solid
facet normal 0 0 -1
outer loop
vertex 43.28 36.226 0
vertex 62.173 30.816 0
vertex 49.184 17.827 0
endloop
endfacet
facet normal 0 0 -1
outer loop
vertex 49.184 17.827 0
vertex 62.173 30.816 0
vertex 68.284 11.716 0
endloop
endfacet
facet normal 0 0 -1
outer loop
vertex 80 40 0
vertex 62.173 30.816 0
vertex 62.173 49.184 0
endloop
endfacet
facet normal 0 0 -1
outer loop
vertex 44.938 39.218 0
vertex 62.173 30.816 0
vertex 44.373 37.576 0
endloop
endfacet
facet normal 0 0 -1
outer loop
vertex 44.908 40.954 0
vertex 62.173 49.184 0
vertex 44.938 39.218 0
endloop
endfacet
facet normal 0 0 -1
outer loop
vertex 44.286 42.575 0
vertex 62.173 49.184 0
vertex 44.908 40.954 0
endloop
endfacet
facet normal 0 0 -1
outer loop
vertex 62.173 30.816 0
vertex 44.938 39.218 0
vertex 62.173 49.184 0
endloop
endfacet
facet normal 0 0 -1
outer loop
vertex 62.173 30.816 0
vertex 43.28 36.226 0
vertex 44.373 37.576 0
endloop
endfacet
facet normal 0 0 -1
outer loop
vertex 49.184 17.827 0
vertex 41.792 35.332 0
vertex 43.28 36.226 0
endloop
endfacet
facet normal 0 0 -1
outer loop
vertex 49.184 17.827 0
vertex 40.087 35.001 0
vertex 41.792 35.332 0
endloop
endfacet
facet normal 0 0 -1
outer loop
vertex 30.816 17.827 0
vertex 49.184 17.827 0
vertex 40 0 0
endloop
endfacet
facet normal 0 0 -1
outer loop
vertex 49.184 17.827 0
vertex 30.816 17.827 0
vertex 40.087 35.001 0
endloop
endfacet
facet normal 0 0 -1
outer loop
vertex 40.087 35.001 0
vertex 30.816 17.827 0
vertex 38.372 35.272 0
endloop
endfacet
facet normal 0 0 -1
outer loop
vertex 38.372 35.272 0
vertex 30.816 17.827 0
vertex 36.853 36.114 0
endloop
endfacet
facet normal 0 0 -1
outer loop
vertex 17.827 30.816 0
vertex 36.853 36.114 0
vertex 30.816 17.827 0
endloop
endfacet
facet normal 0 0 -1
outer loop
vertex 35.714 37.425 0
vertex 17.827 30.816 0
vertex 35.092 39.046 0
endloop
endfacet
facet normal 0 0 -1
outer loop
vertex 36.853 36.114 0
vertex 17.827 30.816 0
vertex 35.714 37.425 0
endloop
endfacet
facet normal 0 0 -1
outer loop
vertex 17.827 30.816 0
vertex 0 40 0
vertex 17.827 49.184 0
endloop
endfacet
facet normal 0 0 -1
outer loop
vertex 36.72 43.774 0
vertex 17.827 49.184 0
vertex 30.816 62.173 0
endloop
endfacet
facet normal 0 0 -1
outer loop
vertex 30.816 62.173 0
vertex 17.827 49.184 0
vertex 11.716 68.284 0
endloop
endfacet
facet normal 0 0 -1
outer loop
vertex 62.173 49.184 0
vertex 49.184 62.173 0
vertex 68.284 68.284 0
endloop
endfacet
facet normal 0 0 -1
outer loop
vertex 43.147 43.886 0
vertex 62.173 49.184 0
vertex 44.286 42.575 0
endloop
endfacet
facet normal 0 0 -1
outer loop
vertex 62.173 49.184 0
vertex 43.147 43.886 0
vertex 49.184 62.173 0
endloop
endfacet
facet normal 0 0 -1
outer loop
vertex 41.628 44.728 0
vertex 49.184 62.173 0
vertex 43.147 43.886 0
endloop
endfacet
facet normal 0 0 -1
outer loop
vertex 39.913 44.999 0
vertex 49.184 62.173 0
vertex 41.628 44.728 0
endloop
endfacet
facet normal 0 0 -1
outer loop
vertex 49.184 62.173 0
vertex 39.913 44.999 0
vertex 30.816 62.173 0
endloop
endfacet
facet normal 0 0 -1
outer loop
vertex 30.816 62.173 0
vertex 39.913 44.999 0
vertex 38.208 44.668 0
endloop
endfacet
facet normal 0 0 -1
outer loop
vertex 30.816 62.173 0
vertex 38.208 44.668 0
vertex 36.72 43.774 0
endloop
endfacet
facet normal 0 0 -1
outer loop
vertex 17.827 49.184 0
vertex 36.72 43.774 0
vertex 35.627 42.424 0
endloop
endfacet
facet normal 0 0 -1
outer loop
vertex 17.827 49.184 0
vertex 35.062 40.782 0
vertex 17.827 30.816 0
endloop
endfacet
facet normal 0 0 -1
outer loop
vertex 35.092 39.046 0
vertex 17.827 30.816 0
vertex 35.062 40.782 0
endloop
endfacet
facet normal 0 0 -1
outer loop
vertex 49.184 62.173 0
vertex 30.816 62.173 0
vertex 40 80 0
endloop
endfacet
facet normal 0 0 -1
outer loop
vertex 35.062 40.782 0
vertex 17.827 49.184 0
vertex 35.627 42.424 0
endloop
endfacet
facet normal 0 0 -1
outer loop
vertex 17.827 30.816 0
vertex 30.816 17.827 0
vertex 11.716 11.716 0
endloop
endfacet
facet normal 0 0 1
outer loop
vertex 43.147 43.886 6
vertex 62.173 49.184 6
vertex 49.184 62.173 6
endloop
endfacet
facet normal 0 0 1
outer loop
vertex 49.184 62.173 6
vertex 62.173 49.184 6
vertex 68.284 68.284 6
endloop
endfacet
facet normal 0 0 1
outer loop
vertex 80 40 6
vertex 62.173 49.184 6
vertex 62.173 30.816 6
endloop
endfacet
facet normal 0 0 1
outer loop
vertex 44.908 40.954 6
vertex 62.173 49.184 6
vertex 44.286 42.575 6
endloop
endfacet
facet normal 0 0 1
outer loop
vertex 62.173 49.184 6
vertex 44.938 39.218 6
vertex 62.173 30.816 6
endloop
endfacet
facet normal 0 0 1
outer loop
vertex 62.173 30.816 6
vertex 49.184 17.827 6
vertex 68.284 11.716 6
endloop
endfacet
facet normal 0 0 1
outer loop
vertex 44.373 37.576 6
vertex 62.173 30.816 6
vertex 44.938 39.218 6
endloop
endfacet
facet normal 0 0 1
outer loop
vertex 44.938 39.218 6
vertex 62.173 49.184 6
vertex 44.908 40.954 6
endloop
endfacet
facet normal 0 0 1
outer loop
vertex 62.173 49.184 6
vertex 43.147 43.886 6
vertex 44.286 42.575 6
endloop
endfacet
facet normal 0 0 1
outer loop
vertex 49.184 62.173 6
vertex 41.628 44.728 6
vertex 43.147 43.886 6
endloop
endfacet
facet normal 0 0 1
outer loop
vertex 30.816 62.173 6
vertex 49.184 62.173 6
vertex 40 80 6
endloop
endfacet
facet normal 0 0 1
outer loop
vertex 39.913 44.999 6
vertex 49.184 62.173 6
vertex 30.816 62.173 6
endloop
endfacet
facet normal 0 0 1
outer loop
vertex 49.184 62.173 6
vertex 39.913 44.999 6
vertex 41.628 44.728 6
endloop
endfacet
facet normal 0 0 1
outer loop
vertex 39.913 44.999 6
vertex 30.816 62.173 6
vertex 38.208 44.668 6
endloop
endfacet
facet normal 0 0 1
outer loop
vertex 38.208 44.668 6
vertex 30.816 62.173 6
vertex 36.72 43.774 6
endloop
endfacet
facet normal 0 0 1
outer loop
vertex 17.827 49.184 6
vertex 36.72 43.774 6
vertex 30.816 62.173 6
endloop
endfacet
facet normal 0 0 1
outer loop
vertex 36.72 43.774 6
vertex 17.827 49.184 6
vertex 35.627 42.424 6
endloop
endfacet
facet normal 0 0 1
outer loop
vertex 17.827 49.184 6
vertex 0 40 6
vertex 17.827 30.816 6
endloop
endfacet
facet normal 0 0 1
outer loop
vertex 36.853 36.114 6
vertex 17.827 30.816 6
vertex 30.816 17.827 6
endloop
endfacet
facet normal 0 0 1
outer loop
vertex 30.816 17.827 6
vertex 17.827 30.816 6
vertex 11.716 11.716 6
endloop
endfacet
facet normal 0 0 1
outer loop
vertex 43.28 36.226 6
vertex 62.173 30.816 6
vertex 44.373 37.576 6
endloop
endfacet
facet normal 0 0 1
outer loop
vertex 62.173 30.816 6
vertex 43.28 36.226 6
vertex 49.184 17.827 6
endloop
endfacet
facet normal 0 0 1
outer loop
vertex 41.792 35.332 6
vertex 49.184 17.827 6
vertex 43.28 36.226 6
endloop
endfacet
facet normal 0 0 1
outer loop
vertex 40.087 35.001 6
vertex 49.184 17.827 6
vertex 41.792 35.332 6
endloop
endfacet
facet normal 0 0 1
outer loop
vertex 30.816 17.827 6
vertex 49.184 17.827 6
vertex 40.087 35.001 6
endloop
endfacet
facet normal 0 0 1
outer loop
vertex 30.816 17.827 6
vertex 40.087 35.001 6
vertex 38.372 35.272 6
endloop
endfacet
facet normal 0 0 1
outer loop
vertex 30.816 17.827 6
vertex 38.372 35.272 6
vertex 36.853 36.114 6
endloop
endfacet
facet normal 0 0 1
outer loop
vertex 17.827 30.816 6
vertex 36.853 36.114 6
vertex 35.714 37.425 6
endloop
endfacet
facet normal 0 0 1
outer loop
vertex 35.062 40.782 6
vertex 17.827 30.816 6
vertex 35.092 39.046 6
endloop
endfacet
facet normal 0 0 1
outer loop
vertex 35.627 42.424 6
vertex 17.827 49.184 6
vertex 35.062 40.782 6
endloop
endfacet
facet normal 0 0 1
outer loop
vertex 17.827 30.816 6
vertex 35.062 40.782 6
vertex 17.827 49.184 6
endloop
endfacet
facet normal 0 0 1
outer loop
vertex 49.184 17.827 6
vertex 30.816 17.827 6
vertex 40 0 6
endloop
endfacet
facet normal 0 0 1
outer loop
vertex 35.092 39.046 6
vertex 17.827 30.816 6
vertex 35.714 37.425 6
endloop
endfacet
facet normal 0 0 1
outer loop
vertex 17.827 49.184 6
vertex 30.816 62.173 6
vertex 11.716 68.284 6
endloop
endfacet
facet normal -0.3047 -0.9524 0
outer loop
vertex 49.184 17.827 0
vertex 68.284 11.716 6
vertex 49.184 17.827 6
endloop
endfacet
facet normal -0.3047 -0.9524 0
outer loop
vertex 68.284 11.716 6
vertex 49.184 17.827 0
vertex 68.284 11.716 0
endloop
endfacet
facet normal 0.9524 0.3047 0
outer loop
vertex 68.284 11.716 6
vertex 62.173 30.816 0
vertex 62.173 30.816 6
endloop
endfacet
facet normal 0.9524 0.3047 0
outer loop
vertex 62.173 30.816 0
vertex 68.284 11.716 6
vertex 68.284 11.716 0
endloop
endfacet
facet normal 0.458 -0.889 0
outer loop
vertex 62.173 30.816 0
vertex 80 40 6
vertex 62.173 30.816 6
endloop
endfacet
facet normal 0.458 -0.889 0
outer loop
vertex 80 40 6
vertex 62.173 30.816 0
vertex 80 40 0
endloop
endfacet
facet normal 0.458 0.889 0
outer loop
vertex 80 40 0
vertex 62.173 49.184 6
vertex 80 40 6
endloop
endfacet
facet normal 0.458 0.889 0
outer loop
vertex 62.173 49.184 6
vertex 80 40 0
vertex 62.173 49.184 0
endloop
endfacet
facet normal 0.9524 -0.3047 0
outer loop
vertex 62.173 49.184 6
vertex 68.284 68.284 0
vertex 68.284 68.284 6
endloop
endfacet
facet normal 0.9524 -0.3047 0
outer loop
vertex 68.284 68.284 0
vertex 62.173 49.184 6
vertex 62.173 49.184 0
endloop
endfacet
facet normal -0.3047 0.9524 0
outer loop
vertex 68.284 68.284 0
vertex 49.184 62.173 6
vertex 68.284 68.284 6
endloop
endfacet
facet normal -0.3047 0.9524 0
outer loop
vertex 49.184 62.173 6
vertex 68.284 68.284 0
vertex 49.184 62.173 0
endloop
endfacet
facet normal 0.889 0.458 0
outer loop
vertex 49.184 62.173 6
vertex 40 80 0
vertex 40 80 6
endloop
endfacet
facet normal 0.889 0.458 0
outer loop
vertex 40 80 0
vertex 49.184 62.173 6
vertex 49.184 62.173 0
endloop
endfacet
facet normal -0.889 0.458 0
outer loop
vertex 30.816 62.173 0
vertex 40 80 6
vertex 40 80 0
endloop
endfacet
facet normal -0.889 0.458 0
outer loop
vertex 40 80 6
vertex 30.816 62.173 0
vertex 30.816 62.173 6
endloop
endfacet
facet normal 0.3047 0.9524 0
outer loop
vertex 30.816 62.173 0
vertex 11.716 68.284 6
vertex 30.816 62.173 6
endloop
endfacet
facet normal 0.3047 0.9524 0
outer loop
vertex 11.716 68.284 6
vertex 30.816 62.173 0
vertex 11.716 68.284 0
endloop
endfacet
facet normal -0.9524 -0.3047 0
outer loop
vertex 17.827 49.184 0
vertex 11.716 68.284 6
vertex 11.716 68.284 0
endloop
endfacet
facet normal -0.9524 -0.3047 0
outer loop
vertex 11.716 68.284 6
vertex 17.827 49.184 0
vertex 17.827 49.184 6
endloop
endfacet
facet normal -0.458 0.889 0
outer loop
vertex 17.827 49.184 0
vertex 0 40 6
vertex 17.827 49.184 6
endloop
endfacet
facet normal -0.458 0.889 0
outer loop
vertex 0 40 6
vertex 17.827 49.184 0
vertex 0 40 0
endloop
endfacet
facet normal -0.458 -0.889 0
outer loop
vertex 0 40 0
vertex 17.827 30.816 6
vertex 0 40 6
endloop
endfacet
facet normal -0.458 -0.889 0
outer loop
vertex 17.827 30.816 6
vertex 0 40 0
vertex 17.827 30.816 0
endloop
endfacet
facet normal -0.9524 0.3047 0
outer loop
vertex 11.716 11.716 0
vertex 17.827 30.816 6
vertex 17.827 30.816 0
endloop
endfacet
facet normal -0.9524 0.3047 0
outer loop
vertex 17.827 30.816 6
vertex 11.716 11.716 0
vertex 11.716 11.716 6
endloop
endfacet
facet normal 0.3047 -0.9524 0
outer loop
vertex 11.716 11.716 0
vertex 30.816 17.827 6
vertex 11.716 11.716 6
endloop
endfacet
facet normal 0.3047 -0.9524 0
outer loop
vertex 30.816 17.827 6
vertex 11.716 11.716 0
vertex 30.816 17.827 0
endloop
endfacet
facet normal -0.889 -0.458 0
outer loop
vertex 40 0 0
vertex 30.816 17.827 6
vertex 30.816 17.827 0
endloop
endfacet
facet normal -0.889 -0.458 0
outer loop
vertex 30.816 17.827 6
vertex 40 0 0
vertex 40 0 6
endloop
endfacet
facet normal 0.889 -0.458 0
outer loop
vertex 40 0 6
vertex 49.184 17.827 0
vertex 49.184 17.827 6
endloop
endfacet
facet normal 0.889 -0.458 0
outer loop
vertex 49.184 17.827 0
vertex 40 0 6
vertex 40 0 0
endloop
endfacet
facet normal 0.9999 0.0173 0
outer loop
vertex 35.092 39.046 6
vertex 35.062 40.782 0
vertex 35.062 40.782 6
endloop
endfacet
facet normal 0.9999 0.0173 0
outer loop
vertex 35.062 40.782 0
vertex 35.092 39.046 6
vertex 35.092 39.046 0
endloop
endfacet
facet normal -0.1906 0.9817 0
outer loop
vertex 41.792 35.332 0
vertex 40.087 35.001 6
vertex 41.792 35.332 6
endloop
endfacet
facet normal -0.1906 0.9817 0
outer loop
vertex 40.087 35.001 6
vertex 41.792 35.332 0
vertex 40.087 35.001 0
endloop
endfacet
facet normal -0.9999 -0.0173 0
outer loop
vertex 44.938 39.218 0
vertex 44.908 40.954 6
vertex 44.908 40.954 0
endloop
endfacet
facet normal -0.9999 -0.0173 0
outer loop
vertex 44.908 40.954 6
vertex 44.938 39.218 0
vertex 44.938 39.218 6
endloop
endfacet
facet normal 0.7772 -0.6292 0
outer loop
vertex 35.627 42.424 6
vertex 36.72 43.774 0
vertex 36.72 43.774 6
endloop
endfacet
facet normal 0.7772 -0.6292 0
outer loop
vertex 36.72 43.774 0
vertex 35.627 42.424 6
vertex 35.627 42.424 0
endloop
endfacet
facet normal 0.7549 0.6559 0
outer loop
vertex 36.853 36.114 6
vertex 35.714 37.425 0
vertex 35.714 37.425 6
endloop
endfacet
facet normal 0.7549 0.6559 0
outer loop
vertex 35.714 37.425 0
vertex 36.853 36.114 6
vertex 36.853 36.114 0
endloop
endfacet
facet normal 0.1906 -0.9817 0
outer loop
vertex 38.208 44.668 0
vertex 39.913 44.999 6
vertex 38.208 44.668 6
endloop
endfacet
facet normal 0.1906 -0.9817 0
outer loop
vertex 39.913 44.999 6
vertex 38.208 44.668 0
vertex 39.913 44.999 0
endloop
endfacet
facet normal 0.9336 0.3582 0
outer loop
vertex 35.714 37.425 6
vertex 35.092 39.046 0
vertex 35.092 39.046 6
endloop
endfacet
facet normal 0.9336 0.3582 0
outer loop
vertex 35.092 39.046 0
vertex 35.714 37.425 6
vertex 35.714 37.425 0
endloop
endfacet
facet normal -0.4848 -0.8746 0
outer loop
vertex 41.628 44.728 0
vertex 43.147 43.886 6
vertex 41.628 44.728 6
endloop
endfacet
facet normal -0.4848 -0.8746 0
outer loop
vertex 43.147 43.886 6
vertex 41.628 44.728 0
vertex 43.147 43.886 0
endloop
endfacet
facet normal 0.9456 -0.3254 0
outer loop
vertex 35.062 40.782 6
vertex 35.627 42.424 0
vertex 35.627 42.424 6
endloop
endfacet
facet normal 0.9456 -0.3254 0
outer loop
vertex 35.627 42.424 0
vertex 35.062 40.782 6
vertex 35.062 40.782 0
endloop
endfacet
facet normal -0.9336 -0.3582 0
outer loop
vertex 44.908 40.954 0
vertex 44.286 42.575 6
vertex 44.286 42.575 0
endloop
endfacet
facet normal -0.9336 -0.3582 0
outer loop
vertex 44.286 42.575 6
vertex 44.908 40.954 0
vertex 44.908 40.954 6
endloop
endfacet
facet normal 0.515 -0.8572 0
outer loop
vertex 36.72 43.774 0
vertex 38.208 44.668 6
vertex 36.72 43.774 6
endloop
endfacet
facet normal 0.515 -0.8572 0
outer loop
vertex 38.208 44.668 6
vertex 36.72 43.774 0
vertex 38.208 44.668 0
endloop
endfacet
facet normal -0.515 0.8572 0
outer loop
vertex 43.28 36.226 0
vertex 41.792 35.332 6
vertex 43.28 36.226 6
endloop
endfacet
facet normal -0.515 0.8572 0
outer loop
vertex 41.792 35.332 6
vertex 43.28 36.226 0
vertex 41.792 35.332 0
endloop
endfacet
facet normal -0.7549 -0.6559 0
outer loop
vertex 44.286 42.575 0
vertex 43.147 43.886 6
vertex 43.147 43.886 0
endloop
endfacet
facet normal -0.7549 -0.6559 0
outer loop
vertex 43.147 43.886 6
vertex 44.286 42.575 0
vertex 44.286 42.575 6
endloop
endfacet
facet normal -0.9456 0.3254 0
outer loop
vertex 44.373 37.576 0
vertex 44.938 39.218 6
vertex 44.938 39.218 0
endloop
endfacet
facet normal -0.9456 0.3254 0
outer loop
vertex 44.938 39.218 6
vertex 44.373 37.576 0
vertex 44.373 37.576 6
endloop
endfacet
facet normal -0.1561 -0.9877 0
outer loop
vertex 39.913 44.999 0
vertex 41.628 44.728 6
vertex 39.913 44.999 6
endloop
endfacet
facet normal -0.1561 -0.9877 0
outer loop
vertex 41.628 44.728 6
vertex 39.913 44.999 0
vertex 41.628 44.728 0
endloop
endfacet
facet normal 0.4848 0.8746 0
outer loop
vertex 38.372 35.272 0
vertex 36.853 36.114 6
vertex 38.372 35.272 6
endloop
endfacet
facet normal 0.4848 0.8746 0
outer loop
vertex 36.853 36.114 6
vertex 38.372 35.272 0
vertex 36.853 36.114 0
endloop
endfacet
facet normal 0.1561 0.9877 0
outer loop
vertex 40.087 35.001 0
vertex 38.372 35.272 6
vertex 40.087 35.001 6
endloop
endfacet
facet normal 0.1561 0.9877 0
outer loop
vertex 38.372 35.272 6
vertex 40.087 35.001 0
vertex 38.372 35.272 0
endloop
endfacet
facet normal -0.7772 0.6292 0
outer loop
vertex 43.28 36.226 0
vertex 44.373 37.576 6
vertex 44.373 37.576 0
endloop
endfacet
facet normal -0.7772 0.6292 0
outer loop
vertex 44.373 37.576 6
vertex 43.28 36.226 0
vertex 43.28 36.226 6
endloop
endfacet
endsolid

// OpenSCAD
$fn = 32;

// ----------------------------------------------------------------------
// Star wheel: 8-point star, R40
// ----------------------------------------------------------------------

// --- parameters (mm) ---
n_points = 8;             // number of points / teeth
r_out = 40;               // tip radius
r_in = 24;                // root radius
bore_r = 5;               // centre bore radius
plate_t = 6;              // plate thickness, Z (extrusion height)
bore_d = 10;              // centre bore diameter

profile = [[0, 40], [17.827, 30.816], [11.716, 11.716], [30.816, 17.827], [40, 0], [49.184, 17.827], [68.284, 11.716], [62.173, 30.816], [80, 40], [62.173, 49.184], [68.284, 68.284], [49.184, 62.173], [40, 80], [30.816, 62.173], [11.716, 68.284], [17.827, 49.184]];  // primary outline, 16 points, counter clockwise
void_1 = [[44.908, 40.954], [44.286, 42.575], [43.147, 43.886], [41.628, 44.728], [39.913, 44.999], [38.208, 44.668], [36.72, 43.774], [35.627, 42.424], [35.062, 40.782], [35.092, 39.046], [35.714, 37.425], [36.853, 36.114], [38.372, 35.272], [40.087, 35.001], [41.792, 35.332], [43.28, 36.226], [44.373, 37.576], [44.938, 39.218]];  // centre bore, 18 points

// --- the one profile operation ---
difference() {
  linear_extrude(height = plate_t) polygon(points = profile);
  translate([0, 0, -1])
    linear_extrude(height = plate_t + 2) polygon(points = void_1);
}
